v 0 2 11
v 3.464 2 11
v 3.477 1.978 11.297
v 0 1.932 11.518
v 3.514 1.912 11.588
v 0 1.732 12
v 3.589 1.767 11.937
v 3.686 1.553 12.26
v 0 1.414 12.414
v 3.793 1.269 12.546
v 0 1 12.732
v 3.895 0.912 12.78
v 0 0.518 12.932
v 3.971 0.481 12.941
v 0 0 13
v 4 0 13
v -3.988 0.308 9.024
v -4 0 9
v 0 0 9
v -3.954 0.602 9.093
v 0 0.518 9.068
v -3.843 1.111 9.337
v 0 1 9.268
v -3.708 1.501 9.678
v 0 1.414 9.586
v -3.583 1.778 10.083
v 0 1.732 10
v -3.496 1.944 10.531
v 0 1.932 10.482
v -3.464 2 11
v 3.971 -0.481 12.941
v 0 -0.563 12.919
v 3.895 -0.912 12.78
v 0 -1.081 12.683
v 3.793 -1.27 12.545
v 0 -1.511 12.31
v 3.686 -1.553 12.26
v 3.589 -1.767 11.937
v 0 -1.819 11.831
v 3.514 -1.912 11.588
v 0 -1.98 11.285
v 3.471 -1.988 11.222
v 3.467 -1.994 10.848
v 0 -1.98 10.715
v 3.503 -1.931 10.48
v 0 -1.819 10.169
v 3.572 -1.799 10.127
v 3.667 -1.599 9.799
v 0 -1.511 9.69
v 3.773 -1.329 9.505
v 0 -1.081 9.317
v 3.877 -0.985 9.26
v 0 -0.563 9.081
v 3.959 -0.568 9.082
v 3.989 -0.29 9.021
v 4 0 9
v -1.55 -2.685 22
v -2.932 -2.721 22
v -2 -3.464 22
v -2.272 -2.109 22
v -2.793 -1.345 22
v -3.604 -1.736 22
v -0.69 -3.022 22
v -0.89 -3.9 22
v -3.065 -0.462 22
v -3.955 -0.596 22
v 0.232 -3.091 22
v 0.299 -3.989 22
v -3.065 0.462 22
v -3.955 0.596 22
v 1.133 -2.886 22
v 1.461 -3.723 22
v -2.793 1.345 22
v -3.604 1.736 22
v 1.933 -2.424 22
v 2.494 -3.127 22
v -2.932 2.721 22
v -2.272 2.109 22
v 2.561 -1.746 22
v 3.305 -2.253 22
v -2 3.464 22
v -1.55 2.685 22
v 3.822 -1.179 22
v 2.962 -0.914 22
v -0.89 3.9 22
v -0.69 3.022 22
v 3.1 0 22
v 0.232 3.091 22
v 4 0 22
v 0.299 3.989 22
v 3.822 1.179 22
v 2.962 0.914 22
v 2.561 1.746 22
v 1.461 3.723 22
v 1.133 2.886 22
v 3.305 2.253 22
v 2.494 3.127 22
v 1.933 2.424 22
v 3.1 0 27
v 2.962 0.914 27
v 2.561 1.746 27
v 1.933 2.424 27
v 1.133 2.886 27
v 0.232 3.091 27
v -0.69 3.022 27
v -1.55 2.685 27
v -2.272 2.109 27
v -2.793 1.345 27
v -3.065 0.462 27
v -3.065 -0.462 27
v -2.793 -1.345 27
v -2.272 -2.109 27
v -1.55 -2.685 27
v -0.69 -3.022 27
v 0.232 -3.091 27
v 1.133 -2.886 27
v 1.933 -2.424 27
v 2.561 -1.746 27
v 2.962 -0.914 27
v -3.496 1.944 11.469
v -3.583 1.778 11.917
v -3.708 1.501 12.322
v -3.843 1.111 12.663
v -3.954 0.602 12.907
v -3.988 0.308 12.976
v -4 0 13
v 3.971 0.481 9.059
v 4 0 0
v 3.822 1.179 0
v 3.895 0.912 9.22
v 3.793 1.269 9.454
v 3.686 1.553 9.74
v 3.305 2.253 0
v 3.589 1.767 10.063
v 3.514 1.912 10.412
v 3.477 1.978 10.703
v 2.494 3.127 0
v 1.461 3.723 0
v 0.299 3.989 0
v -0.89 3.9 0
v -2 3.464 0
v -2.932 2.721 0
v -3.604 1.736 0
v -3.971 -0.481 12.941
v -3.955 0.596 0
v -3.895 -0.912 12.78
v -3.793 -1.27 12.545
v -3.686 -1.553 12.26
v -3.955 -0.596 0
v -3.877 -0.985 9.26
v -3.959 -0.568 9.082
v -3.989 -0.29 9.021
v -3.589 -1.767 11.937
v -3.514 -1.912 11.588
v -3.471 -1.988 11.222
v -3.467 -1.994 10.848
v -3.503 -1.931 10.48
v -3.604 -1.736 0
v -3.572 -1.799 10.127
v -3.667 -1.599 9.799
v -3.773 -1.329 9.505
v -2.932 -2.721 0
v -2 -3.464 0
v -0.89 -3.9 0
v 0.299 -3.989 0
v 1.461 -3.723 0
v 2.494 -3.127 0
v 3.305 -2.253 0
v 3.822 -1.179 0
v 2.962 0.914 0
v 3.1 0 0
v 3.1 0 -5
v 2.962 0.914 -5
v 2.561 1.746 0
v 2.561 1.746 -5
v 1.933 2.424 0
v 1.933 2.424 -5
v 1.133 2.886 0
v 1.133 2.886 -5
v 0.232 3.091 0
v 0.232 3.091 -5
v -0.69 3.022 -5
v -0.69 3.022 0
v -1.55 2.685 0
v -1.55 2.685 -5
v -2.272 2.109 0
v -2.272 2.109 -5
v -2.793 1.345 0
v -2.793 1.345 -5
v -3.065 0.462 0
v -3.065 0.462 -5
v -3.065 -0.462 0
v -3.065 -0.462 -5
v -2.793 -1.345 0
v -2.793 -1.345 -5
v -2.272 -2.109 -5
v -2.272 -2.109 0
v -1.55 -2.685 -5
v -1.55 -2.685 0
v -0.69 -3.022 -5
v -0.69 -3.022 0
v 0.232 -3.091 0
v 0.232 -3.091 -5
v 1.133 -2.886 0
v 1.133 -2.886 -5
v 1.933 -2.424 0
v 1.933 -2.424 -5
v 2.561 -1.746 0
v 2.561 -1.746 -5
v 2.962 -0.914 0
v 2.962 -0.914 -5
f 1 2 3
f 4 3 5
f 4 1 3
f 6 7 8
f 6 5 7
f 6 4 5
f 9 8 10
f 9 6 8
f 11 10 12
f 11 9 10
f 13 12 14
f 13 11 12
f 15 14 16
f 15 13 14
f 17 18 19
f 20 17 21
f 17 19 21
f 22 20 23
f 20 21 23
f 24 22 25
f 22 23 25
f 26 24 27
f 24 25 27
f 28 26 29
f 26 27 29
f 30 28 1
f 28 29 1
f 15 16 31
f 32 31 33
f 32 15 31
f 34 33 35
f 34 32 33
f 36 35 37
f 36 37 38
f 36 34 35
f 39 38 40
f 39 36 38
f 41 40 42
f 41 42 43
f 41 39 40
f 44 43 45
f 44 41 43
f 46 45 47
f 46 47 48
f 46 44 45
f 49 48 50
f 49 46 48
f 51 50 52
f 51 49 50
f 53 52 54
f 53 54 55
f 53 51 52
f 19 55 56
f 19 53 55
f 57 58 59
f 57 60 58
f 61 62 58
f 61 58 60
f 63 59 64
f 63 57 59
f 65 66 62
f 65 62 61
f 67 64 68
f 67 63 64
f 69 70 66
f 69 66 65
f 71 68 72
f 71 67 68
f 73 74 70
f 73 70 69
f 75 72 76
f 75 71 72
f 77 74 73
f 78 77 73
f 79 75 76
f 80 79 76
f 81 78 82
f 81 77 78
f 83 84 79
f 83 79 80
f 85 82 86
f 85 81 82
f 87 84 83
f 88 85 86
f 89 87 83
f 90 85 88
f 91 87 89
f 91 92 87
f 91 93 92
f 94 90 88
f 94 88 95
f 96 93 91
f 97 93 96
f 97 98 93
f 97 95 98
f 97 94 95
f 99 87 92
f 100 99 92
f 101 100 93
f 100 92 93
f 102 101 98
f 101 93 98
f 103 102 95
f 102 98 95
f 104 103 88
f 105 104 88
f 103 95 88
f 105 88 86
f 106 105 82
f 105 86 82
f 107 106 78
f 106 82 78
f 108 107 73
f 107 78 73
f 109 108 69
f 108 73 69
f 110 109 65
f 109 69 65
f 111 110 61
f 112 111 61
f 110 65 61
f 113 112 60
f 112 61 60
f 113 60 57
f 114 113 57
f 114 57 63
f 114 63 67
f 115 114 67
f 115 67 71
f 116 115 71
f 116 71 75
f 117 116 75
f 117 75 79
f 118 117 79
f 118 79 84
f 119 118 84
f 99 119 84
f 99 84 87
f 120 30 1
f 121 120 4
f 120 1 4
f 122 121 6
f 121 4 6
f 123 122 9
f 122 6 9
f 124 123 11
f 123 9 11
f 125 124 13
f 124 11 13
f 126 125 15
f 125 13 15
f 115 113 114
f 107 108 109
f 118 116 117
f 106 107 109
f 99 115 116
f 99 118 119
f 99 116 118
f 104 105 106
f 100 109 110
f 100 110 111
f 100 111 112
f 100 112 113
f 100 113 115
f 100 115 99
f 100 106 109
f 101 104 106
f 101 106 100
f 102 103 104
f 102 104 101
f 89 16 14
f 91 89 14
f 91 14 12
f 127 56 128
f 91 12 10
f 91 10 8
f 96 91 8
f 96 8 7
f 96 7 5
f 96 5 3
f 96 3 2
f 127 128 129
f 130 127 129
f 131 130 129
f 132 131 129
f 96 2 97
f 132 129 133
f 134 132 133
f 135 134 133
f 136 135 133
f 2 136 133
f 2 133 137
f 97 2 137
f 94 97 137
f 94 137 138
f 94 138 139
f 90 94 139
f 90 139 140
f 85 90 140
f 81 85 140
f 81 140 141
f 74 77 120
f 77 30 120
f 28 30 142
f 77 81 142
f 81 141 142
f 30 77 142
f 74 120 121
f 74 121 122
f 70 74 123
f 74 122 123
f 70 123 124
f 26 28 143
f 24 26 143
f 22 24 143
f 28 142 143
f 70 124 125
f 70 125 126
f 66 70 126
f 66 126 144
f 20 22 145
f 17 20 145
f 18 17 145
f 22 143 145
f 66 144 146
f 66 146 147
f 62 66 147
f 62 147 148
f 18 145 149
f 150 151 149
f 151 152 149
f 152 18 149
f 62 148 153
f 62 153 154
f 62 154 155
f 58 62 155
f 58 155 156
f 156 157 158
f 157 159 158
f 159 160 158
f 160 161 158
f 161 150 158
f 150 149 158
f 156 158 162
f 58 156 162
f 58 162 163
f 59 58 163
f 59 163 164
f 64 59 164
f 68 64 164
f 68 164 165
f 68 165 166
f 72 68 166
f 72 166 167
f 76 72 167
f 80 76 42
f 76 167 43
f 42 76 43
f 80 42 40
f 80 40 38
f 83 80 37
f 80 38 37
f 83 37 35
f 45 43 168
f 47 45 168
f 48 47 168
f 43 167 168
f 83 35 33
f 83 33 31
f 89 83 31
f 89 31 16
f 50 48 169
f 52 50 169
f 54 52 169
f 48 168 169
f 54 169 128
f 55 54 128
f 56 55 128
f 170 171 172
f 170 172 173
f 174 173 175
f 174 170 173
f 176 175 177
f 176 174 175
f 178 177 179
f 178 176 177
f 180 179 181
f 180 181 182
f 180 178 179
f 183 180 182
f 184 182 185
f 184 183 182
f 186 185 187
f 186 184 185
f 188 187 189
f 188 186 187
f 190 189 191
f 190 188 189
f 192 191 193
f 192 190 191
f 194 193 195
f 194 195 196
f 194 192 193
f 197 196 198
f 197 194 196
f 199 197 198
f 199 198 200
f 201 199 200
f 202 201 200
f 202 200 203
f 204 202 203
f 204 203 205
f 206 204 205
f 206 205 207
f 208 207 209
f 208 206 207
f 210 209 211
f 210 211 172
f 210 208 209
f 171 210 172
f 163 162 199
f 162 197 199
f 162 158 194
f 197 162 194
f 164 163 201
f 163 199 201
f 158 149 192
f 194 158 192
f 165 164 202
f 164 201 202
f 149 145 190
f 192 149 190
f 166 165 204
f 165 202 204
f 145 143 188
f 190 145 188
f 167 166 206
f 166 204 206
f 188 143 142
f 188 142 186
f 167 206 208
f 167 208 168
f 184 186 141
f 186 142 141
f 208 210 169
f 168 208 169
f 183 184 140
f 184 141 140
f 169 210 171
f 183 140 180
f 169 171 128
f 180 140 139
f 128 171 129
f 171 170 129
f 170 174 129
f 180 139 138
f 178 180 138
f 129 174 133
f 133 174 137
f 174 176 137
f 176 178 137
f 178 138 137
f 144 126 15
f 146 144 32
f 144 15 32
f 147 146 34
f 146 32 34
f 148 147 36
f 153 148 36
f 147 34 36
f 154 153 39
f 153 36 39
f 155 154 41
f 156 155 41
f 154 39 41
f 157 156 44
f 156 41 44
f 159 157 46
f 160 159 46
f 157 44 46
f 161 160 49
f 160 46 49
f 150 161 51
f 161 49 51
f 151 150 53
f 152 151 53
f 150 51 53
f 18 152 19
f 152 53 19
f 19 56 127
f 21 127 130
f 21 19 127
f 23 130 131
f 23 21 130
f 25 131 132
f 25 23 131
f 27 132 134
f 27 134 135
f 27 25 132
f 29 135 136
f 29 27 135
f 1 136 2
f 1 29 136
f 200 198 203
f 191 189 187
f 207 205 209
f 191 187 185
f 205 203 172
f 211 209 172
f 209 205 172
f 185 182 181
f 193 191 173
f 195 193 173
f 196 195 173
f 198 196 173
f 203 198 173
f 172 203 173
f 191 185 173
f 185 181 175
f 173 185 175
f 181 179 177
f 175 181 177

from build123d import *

# Parameters (mm, degrees)
F0_R     = 4
F0_R_2   = 3.1
F1_DEPTH = 22
F2_DEPTH = 27
F3_DEPTH = 5
F5_DEPTH = 25
F6_DEPTH = 25


with BuildPart() as f1:
    # F0 (on Top) → F1 (new body)
    with BuildSketch(Plane.XY):
        Circle(F0_R)
        Circle(F0_R_2, mode=Mode.SUBTRACT)
    extrude(amount=F1_DEPTH)

    # F0 (on Top) → F2 (join)
    with BuildSketch(Plane.XY):
        Circle(F0_R_2)
    extrude(amount=F2_DEPTH)

    # F0 (on Top) → F3 (join)
    with BuildSketch(Plane.XY):
        Circle(F0_R_2)
    extrude(amount=-F3_DEPTH)

    # F4 (on Right) → F5 (cut)
    with BuildSketch(Plane.YZ):
        with BuildLine():
            ThreePointArc((0, 13), (-2, 11), (0, 9))
            Line((0, 9), (0, 13))
        make_face()
        with BuildLine():
            Line((0, 13), (0, 9))
            ThreePointArc((0, 9), (1.4142135624, 9.5857864376), (2, 11))
            ThreePointArc((2, 11), (1.4142135624, 12.4142135624), (0, 13))
        make_face()
    extrude(amount=F5_DEPTH, mode=Mode.SUBTRACT)

    # F6 (cut): a face of the model
    f6_faces = [f1.faces().sort_by_distance(p)[0] for p in [
        (0, 0, 11),
    ]]
    extrude(f6_faces, amount=-F6_DEPTH, mode=Mode.SUBTRACT)


solid = f1.part
